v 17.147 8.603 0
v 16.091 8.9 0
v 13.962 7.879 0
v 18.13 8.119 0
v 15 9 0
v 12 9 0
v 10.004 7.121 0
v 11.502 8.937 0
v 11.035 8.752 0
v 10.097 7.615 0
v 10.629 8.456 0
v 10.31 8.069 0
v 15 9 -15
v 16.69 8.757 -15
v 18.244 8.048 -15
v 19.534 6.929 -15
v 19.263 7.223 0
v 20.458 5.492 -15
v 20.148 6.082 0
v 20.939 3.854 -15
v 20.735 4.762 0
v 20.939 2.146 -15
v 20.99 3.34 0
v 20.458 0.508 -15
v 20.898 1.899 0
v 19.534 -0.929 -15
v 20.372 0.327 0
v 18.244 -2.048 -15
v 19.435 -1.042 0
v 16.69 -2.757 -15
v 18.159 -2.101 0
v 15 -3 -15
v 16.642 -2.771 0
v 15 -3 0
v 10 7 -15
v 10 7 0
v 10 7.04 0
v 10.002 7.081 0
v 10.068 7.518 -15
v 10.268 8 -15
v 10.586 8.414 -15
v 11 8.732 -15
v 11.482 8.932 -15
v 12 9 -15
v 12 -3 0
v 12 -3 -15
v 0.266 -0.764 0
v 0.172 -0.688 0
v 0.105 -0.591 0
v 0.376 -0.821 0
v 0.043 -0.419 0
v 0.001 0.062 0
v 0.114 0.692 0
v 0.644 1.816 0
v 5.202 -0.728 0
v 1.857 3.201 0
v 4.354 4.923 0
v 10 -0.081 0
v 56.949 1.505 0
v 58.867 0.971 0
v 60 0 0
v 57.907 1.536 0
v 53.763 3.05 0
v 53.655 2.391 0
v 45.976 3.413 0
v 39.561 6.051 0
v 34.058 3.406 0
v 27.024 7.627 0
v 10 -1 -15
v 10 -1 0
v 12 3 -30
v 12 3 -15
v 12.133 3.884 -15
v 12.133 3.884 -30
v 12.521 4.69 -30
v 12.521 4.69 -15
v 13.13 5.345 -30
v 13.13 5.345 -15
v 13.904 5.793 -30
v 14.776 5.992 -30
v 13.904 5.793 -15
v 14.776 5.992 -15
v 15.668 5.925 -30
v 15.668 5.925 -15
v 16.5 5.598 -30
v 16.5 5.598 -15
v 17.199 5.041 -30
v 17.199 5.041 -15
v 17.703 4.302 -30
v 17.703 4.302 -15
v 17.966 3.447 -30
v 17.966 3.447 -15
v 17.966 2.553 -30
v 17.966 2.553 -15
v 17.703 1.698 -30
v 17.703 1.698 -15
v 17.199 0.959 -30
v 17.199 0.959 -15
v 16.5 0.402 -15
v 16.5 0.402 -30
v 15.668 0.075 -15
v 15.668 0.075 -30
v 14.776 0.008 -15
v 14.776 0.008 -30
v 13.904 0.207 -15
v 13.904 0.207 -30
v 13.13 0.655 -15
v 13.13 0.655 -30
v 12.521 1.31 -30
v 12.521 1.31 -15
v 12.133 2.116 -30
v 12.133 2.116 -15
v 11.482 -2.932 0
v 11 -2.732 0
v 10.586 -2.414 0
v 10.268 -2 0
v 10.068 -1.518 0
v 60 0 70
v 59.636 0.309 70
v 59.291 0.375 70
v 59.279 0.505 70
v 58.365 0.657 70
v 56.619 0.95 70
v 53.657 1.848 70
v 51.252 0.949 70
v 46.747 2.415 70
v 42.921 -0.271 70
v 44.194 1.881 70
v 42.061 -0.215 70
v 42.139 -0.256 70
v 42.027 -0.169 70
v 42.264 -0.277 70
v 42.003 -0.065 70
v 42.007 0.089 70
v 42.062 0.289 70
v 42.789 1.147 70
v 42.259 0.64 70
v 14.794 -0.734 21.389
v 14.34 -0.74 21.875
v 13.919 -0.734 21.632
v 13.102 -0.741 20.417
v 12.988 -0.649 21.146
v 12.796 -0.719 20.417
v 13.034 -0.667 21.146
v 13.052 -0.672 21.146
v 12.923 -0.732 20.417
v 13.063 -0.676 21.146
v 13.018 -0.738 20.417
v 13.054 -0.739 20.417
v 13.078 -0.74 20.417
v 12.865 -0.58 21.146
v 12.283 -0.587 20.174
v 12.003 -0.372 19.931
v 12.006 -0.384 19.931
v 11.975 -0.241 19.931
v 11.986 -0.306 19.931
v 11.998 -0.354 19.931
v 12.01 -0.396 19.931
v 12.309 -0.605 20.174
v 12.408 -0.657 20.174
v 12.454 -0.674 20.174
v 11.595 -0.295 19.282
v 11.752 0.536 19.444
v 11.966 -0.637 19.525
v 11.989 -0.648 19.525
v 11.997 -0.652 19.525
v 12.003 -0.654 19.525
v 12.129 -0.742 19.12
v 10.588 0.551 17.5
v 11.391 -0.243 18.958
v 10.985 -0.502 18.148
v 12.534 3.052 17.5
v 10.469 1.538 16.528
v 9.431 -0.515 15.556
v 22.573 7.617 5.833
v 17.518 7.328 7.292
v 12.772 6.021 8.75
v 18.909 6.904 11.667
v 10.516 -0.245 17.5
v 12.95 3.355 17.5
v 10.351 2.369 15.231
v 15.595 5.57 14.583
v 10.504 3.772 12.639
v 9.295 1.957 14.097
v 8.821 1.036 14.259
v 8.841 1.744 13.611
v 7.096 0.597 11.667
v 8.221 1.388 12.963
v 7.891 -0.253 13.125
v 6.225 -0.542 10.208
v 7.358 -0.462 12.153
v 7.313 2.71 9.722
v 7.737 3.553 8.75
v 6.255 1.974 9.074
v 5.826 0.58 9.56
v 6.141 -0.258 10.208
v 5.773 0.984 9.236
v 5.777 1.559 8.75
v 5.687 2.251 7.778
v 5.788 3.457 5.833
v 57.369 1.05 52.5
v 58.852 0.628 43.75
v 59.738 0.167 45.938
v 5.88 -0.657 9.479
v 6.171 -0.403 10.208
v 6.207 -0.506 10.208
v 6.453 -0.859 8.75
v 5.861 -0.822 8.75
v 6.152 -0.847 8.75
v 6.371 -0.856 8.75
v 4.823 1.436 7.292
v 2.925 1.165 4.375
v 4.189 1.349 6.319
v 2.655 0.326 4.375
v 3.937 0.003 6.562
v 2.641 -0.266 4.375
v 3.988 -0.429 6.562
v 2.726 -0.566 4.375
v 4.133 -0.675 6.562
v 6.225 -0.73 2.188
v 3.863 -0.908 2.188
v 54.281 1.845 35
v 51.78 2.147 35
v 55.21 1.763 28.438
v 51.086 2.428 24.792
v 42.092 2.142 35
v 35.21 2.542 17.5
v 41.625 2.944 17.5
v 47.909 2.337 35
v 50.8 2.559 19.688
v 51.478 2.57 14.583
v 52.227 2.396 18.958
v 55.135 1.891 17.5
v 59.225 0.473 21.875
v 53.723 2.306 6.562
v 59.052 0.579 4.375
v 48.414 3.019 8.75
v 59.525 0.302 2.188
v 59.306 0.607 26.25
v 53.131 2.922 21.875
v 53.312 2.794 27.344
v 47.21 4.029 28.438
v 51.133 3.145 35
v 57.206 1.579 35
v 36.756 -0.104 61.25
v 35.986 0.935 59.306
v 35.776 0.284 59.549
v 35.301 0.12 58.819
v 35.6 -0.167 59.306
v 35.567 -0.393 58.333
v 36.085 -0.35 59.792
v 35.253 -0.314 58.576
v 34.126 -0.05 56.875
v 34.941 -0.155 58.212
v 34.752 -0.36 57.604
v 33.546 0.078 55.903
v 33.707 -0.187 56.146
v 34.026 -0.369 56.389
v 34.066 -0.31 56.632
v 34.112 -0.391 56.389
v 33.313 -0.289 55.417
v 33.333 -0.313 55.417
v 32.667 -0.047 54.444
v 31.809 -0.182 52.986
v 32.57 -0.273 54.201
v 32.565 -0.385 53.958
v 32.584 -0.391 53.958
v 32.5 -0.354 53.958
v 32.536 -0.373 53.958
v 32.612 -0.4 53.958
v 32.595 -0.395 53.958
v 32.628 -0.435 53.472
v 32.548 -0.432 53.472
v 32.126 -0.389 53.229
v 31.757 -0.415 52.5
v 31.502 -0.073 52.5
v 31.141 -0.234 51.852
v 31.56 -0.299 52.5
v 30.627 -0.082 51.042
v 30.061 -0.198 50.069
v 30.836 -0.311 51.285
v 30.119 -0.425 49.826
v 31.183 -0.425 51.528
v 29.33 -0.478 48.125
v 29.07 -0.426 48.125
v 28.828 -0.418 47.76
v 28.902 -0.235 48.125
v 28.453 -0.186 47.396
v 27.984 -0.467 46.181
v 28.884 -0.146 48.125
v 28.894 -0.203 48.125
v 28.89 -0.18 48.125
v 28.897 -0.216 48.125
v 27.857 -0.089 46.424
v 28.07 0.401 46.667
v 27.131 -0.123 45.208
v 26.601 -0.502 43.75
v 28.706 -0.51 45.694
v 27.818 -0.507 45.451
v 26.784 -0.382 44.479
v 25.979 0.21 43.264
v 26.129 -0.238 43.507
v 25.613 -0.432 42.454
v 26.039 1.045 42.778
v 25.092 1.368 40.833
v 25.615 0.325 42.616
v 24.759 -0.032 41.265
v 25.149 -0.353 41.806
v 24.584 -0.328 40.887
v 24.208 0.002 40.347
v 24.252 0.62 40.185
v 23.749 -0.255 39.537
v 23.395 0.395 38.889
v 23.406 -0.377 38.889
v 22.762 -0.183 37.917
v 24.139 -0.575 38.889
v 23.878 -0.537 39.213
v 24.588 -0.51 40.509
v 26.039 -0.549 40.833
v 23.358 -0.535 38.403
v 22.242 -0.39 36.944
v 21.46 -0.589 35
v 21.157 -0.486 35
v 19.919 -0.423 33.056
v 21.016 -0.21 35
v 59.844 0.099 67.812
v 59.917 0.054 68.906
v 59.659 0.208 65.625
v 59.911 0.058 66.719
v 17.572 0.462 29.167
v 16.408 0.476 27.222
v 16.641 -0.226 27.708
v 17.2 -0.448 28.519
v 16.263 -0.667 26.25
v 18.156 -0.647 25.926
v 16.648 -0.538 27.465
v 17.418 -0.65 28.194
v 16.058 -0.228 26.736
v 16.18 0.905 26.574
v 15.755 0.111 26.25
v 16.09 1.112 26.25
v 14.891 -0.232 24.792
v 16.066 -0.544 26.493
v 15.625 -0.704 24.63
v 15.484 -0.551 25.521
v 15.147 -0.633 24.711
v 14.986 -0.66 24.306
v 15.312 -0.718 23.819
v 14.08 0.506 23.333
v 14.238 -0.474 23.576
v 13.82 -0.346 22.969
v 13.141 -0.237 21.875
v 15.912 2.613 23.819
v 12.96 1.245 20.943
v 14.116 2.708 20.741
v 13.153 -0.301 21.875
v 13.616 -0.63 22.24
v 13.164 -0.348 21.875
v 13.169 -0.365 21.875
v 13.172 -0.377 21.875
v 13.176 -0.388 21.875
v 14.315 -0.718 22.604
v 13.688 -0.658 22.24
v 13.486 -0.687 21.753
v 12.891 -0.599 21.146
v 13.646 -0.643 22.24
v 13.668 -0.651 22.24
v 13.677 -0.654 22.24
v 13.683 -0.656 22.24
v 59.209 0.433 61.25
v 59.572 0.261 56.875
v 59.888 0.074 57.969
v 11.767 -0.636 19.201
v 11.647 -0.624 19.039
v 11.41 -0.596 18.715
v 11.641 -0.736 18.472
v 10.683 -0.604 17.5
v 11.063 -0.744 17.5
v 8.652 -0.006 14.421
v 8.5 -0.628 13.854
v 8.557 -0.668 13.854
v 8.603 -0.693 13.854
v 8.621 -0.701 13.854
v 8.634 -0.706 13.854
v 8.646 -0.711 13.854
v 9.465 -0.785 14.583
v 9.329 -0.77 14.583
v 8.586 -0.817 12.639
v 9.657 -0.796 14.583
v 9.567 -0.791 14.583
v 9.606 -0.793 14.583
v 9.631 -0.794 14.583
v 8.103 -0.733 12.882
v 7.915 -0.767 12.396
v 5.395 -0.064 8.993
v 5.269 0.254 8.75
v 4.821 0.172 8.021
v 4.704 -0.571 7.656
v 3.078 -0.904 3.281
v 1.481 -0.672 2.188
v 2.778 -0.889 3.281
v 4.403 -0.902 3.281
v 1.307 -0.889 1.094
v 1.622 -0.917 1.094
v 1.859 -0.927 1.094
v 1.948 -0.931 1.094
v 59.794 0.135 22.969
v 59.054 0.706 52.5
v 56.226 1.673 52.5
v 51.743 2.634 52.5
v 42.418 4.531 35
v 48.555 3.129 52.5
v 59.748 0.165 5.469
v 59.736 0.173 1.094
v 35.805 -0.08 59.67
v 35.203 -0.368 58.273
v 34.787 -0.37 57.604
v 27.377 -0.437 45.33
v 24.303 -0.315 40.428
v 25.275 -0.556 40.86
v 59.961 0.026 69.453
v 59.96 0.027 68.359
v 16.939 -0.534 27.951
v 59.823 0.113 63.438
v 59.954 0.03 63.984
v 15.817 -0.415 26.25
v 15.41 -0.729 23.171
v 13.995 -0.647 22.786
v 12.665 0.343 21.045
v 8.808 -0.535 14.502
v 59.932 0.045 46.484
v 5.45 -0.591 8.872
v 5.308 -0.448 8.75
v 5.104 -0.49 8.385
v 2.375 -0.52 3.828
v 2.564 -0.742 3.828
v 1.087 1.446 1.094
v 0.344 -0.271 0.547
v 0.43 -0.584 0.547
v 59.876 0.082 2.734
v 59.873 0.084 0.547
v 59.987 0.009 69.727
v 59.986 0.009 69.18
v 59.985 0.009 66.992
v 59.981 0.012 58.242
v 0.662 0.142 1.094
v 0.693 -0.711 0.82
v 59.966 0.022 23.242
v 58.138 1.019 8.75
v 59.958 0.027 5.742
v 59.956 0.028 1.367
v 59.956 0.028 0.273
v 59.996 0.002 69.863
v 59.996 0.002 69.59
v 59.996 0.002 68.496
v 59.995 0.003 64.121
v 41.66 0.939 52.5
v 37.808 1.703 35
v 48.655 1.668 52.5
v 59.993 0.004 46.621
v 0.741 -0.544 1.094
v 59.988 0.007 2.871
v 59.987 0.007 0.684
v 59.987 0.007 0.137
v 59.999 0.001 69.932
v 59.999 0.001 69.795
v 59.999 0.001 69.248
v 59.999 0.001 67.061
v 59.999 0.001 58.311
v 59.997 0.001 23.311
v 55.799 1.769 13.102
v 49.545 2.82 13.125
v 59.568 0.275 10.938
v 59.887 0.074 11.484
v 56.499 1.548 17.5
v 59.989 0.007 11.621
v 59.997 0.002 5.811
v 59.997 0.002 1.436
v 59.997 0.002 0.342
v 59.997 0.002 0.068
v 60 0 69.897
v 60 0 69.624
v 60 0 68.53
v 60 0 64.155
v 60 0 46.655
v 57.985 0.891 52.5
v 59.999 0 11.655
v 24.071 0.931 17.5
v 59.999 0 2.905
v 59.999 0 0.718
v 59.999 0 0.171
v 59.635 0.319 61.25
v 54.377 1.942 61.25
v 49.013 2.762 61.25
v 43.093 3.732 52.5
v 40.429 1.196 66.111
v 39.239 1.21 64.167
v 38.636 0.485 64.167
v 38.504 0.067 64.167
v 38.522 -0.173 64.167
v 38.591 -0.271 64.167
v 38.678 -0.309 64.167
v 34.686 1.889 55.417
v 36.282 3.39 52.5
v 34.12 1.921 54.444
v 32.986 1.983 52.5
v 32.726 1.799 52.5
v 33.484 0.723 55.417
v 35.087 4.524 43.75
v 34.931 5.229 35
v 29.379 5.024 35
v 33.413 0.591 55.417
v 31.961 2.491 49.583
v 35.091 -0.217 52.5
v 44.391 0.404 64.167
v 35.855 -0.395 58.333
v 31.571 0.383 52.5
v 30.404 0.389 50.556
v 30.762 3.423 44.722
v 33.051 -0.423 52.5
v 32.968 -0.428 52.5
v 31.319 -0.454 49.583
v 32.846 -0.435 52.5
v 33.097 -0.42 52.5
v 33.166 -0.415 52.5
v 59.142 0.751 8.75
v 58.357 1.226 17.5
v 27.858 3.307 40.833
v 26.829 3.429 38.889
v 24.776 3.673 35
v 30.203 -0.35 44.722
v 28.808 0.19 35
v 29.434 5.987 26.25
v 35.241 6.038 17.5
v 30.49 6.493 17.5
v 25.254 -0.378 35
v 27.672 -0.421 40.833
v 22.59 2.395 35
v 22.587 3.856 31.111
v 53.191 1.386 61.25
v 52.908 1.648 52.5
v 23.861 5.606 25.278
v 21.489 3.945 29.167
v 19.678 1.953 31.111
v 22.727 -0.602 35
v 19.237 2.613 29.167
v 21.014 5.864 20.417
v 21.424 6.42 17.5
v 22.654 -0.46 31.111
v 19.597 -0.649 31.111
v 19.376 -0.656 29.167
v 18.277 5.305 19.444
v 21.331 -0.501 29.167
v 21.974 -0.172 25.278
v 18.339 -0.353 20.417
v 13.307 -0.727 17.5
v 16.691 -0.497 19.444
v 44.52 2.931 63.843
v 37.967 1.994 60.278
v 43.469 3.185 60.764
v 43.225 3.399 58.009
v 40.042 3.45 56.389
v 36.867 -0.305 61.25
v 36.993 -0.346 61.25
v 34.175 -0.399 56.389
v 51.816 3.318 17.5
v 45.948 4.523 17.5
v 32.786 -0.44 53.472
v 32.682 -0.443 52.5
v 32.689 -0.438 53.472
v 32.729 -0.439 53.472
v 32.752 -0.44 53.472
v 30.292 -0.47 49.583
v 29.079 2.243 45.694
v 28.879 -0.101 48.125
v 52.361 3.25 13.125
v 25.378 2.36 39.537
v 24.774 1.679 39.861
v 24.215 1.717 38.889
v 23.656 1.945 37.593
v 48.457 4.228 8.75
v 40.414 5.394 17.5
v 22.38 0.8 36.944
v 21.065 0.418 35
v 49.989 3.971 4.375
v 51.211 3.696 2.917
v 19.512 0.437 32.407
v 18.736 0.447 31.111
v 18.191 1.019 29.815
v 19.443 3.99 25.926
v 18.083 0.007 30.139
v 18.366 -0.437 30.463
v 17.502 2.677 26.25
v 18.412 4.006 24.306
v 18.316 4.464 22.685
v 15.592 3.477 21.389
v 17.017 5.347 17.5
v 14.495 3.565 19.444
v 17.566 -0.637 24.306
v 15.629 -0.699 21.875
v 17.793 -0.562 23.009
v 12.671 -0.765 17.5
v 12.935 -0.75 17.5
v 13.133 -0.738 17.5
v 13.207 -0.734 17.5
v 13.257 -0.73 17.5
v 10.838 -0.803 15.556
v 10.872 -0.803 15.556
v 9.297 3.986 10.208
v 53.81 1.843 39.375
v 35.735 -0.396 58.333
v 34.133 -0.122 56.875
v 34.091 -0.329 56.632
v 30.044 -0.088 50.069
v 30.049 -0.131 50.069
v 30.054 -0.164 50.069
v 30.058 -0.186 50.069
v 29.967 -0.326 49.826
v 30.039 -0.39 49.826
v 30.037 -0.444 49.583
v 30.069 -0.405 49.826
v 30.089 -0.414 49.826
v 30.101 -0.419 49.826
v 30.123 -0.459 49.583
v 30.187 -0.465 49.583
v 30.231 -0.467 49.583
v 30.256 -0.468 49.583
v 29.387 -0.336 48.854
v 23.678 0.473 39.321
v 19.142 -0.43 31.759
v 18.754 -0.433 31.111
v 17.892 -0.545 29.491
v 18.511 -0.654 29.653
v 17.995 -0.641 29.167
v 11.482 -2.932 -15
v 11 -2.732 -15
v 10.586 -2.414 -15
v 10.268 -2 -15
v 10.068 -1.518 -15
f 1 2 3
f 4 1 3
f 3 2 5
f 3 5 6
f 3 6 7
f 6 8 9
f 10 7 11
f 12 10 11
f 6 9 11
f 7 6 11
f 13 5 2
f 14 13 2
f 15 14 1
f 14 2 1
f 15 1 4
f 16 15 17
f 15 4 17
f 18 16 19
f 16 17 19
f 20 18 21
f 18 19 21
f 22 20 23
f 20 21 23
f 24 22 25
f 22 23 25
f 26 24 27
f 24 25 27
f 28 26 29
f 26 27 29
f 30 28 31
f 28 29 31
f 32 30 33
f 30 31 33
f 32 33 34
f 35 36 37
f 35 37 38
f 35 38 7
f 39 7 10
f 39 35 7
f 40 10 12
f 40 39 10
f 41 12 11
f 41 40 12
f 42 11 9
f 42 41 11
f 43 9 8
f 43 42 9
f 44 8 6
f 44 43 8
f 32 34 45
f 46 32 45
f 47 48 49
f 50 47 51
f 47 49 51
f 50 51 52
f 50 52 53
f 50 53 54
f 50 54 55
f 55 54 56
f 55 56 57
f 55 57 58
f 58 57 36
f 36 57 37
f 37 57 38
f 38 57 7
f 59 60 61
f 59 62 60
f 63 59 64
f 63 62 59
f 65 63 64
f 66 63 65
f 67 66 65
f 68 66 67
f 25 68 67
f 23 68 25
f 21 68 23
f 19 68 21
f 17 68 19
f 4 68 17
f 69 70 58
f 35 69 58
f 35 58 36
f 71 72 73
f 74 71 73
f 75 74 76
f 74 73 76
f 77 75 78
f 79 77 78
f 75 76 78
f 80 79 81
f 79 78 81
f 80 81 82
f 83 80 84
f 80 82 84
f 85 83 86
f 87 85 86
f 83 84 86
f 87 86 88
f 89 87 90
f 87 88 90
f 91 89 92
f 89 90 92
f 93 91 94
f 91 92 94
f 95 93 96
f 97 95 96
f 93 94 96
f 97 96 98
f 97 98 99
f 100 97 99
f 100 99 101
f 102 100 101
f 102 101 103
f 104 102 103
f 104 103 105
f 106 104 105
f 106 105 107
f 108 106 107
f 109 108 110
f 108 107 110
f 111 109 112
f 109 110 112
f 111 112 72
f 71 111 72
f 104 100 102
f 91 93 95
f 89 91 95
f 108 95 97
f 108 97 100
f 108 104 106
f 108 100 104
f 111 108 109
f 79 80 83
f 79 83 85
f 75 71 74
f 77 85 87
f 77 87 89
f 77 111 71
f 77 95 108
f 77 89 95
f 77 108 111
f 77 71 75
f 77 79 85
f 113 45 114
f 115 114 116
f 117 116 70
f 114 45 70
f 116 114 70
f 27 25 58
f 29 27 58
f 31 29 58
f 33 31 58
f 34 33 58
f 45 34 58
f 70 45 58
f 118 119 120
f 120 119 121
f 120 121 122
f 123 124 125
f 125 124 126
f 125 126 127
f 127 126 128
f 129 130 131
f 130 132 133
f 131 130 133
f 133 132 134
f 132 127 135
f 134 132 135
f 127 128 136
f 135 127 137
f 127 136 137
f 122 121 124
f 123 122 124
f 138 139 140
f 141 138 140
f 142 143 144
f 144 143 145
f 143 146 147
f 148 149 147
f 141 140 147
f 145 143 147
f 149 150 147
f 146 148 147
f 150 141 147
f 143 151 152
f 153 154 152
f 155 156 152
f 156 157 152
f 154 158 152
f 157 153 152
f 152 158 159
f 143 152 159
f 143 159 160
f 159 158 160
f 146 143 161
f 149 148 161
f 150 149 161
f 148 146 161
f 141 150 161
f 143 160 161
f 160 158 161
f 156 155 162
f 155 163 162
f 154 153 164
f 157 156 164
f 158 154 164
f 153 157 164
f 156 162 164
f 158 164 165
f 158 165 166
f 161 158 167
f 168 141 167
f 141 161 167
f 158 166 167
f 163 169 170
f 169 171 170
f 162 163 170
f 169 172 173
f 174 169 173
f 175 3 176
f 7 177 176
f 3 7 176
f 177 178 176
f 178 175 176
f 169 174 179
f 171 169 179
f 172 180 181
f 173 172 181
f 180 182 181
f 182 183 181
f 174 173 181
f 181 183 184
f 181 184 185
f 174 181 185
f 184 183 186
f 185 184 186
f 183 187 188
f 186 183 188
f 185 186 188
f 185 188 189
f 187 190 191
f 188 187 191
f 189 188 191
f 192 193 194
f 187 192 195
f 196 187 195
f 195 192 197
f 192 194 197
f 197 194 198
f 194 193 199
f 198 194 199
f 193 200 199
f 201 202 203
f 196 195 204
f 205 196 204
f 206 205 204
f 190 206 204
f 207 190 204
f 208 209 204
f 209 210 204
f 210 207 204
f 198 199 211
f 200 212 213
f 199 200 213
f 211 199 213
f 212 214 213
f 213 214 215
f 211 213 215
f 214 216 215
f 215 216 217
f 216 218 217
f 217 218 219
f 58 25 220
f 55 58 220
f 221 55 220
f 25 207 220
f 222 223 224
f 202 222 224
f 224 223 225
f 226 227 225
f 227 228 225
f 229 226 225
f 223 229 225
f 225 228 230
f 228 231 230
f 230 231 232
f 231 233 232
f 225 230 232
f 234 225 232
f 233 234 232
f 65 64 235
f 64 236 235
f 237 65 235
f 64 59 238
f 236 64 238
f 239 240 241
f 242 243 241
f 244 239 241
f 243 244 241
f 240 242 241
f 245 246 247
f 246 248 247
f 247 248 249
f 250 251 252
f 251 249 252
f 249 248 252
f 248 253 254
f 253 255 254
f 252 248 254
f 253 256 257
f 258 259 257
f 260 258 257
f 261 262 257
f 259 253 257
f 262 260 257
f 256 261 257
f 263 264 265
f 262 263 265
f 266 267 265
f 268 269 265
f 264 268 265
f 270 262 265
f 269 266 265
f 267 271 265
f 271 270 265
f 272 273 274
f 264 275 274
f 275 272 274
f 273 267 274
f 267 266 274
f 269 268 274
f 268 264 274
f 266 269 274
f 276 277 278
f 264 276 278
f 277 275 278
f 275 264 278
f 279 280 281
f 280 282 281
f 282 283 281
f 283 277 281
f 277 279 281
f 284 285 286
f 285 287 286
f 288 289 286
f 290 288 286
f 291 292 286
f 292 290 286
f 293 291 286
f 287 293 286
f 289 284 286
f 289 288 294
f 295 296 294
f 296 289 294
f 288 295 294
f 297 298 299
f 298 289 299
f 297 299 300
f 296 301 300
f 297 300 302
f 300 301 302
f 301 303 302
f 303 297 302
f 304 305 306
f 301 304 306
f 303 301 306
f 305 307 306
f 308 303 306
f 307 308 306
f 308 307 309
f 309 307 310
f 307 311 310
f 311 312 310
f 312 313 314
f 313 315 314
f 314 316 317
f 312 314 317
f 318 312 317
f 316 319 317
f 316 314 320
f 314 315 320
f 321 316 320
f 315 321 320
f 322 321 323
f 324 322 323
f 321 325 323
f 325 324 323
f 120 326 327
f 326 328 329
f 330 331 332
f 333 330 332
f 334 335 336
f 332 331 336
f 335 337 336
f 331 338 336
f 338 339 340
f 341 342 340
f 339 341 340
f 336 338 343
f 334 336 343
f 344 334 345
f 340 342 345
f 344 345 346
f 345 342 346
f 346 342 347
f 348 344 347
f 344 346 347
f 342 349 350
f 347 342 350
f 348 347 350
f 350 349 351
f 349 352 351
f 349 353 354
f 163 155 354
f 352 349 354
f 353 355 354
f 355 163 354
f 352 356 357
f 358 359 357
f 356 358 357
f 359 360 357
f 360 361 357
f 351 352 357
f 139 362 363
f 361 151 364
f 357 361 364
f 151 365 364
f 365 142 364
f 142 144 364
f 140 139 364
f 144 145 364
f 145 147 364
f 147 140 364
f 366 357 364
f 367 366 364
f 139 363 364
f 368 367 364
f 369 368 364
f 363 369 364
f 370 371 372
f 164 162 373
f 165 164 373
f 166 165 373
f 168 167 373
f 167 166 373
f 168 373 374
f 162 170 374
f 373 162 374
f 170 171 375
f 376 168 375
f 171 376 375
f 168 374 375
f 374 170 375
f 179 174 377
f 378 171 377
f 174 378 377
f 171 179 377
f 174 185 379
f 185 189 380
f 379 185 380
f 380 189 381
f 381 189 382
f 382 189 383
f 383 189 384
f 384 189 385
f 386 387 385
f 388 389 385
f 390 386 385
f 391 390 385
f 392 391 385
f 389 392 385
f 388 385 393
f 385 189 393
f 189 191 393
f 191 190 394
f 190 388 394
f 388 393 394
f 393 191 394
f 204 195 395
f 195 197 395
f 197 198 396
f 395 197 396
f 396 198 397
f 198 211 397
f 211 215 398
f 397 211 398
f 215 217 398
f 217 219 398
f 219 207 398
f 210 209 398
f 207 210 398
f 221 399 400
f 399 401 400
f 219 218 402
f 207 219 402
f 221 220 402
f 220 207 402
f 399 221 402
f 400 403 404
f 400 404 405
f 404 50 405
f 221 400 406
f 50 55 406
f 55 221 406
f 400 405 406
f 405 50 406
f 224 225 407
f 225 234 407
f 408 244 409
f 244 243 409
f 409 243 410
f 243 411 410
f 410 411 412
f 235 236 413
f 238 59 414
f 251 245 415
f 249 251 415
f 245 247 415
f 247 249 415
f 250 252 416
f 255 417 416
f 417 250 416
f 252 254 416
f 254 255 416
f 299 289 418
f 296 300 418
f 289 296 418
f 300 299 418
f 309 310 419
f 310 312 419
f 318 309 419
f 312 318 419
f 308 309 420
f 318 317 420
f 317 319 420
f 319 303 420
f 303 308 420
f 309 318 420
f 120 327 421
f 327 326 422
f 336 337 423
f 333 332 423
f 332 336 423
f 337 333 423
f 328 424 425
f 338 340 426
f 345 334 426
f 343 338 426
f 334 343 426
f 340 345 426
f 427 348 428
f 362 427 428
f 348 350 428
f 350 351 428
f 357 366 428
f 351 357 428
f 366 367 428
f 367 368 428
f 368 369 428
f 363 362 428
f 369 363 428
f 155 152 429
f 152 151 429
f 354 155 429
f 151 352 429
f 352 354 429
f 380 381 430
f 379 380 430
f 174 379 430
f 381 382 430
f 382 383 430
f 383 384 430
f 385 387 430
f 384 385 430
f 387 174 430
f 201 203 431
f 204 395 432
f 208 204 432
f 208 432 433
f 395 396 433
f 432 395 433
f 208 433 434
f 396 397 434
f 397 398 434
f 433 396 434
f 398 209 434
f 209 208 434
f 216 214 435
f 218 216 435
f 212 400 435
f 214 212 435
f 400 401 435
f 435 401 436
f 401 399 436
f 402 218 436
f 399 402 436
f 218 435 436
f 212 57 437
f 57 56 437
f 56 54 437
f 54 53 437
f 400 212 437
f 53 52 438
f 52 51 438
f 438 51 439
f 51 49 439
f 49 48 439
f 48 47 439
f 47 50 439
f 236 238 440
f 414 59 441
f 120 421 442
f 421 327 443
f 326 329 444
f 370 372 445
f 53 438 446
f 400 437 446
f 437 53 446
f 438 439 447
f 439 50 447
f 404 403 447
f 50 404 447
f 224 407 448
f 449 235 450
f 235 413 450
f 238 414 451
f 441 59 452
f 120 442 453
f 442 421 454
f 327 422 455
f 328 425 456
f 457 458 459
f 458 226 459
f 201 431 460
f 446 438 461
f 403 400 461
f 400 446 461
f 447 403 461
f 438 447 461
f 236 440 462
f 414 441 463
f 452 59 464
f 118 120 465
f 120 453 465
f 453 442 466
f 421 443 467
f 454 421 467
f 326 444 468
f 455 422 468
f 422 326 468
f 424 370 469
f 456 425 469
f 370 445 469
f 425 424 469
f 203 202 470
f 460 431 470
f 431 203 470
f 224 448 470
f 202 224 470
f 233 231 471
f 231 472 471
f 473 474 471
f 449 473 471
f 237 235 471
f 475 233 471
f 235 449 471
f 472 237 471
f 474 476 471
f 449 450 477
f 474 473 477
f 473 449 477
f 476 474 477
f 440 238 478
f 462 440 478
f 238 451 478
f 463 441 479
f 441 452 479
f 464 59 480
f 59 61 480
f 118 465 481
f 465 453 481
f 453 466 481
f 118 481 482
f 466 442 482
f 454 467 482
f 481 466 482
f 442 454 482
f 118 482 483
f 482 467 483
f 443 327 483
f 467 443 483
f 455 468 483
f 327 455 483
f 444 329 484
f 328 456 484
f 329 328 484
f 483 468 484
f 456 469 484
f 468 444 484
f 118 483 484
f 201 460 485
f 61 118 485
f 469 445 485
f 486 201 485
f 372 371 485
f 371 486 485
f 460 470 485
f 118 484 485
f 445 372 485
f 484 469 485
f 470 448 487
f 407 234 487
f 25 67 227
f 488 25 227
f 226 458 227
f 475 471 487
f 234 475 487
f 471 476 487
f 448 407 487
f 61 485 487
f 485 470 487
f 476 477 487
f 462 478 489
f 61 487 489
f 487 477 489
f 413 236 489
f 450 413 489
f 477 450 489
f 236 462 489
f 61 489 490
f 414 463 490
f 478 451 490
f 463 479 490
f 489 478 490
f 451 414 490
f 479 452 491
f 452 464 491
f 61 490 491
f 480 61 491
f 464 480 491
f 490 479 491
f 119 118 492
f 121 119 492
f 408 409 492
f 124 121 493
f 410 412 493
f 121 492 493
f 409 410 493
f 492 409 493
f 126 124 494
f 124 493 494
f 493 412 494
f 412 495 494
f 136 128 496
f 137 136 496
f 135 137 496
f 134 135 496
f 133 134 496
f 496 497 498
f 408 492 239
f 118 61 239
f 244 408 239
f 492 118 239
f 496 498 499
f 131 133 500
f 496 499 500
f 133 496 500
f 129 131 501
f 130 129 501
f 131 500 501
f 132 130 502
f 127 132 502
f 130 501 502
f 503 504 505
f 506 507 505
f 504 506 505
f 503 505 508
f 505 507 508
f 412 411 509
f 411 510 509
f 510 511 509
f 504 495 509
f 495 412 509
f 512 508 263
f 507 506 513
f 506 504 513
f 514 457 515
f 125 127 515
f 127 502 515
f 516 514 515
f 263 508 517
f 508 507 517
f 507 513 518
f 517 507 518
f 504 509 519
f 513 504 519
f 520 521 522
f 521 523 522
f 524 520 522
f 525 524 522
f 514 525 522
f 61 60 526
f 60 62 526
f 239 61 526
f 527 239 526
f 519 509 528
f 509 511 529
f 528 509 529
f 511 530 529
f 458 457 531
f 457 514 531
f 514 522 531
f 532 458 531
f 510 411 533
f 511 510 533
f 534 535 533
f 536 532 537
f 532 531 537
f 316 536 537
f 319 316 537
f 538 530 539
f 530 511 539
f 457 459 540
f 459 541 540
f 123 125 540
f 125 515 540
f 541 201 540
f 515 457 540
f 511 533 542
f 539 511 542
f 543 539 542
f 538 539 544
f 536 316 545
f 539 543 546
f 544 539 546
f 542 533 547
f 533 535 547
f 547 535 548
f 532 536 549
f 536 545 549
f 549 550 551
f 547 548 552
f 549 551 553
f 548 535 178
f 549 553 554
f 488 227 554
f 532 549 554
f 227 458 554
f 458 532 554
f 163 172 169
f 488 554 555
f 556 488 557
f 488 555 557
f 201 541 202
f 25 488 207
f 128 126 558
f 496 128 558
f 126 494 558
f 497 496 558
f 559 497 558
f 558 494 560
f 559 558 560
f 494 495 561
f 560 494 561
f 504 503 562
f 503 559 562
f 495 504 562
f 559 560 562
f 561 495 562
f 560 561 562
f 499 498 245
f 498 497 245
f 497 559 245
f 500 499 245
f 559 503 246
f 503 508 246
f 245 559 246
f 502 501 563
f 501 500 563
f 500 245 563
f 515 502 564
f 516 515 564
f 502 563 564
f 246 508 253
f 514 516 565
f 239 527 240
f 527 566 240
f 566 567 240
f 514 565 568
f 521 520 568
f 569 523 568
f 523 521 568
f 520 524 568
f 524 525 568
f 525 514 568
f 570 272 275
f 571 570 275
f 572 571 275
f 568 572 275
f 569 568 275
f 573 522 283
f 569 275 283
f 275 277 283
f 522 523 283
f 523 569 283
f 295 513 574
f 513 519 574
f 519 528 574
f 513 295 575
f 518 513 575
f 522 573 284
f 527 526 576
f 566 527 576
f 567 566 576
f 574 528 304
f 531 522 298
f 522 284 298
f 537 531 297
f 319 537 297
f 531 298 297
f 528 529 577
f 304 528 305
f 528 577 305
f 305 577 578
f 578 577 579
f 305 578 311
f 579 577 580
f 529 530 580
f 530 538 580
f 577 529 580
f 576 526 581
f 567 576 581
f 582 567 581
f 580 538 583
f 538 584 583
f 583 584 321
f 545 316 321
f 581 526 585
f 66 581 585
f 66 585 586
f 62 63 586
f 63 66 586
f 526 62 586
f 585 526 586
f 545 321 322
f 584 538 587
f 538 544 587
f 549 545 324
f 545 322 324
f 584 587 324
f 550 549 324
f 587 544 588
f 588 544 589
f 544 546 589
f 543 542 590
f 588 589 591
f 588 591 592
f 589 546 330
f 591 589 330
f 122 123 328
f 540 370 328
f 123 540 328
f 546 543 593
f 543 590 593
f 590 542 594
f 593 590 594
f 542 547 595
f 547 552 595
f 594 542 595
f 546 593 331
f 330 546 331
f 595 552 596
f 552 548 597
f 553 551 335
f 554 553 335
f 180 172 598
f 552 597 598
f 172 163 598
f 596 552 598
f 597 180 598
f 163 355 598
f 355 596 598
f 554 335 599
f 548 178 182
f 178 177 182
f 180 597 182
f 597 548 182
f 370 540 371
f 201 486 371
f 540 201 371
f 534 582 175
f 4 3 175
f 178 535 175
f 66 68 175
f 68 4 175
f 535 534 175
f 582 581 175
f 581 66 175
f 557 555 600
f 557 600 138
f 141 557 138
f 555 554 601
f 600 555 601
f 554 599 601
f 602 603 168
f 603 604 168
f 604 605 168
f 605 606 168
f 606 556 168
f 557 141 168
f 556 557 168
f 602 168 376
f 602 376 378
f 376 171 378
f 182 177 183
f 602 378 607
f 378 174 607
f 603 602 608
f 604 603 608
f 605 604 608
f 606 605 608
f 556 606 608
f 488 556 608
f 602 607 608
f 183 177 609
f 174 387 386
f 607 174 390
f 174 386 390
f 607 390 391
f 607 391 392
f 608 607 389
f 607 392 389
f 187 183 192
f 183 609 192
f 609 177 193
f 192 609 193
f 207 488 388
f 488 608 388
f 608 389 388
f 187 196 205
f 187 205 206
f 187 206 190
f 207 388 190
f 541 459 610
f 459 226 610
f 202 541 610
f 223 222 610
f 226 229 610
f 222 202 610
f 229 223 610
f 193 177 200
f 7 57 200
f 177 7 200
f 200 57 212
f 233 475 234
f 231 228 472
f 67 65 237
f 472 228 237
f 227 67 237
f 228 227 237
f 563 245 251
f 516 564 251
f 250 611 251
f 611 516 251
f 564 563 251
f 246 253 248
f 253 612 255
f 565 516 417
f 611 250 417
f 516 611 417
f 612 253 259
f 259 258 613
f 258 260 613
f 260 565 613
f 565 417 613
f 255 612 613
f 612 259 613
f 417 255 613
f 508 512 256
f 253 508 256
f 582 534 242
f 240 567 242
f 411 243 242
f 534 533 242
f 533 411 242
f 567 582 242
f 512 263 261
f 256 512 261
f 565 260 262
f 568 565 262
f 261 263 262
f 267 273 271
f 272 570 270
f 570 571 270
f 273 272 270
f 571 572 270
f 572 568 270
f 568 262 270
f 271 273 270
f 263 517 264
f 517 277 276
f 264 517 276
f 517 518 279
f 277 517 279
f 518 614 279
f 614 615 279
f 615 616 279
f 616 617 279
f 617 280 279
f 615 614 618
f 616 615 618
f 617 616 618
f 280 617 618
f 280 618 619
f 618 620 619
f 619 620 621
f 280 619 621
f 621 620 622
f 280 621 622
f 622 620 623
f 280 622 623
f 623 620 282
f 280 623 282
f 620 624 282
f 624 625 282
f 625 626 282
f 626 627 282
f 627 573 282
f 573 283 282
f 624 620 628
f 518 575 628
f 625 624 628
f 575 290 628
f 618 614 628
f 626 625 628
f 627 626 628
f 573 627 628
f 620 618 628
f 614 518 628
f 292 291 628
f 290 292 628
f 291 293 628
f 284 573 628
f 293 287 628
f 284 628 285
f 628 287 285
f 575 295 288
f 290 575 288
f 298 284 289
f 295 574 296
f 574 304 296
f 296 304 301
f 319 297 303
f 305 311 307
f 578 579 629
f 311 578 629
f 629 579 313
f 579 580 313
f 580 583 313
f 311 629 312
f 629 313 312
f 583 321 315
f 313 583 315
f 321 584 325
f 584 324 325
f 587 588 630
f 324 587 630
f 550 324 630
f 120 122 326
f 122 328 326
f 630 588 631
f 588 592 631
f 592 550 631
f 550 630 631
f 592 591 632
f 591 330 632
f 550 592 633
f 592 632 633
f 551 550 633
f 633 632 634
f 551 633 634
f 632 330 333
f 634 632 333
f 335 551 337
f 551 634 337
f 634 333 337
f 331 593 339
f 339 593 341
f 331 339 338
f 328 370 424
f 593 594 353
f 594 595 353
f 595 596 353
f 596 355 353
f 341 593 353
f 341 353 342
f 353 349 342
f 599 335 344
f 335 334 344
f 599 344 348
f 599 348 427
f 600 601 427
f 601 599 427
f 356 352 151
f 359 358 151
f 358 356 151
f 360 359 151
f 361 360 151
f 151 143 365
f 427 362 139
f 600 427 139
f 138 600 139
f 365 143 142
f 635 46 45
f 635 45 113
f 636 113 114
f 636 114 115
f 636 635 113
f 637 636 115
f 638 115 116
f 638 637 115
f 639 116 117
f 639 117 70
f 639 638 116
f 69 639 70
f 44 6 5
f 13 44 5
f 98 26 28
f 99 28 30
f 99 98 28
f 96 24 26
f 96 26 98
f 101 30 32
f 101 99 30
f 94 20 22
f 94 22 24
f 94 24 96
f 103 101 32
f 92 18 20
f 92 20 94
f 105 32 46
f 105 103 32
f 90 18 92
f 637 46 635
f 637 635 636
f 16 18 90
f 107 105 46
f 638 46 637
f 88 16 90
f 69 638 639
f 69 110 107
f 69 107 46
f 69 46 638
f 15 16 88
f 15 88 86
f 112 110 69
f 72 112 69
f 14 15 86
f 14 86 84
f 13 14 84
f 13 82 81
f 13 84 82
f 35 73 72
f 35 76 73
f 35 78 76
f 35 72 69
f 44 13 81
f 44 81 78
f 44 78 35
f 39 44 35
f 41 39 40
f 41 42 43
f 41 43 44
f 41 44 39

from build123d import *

# Parameters (mm, degrees)
BOSS_EXTRUDE2_DEPTH = 15
SKETCH6_R           = 3
BOSS_EXTRUDE3_DEPTH = 15
FILLET1_START       = -16
FILLET1_DEPTH       = 16


with BuildPart() as part:
    # Sketch3 → Loft1 section 0
    with BuildSketch(Plane.XY.offset(70)):
        with BuildLine():
            add(Edge.make_bspline(
                [(60, 0), (60.000107759, 0.00045823), (59.940935145, 0.044545857), (59.890891538, 0.093647308), (59.779774511, 0.196205337), (59.648682422, 0.305307561), (59.469359582, 0.415294301), (59.246370858, 0.521886024), (58.977168165, 0.633116991), (58.662177205, 0.747496515), (58.302798195, 0.863953961), (57.901335106, 0.982592376), (57.458471962, 1.097979924), (56.979558848, 1.219684363), (56.464360521, 1.335758178), (55.917664884, 1.451163432), (55.342255391, 1.563645721), (54.741619221, 1.672310848), (54.119503088, 1.776862794), (53.479502393, 1.875995081), (52.825753205, 1.969890082), (52.162446062, 2.057806833), (51.494385085, 2.13946315), (50.826910973, 2.215437436), (50.165549402, 2.283812601), (49.515688388, 2.343308945), (48.88189852, 2.390577682), (48.267800241, 2.423092507), (47.676809978, 2.437133923), (47.111955291, 2.435639306), (46.574289852, 2.407982369), (46.063605386, 2.351936832), (45.577823009, 2.272687612), (45.116825477, 2.170020947), (44.681086398, 2.04962996), (44.272449438, 1.913646961), (43.892652493, 1.765251918), (43.544055665, 1.605239875), (43.227776887, 1.436859538), (42.94553682, 1.262025717), (42.699105421, 1.083107561), (42.488584367, 0.903897458), (42.317026583, 0.722439194), (42.185248322, 0.540304202), (42.08790704, 0.363111111), (42.025521579, 0.194874666), (41.995794905, 0.039592478), (42.001532957, -0.091739447), (42.035344873, -0.212191985), (42.16102918, -0.271985507), (42.33001338, -0.28037435), (42.561183137, -0.288504849), (42.85189542, -0.275968725), (43.198864607, -0.252931149), (43.598229294, -0.216029949), (44.045902873, -0.166101037), (44.539702369, -0.102073031), (45.07938647, -0.012584366), (45.667582852, 0.09963297), (46.307232102, 0.221761241), (46.995207664, 0.350711186), (47.72718833, 0.481130505), (48.497798407, 0.608124713), (49.301059449, 0.727453141), (50.130048988, 0.834738394), (50.977312155, 0.926856584), (51.834845451, 0.99967222), (52.694043317, 1.051289527), (53.545929342, 1.07966642), (54.381262057, 1.083250625), (55.190722018, 1.061798612), (55.965040428, 1.015812577), (56.694906217, 0.945885863), (57.371629898, 0.8547026), (57.986400744, 0.744908581), (58.532010839, 0.620180946), (58.99840484, 0.486716819), (59.380100231, 0.344272382), (59.652430067, 0.213917485), (59.853211585, 0.093386968), (59.93034321, 0.046743647), (59.99989005, -0.000467545), (60, 0)],
                knots=[0, 0, 0, 0, 0.000979678, 0.003648865, 0.007483504, 0.012095286, 0.017525603, 0.024051797, 0.031783073, 0.040677857, 0.050710337, 0.061833274, 0.073978206, 0.087117514, 0.1011444, 0.115989999, 0.131569795, 0.147787764, 0.164550314, 0.181757305, 0.199311377, 0.217094507, 0.234989676, 0.252856344, 0.270540067, 0.287886265, 0.304772936, 0.321100929, 0.336805584, 0.351799565, 0.366030606, 0.379615227, 0.392652524, 0.405169929, 0.417171498, 0.428603104, 0.439418554, 0.449596189, 0.459101689, 0.467907493, 0.475987922, 0.483308596, 0.48987414, 0.495802886, 0.501149052, 0.505902717, 0.510046415, 0.51357896, 0.516446578, 0.519349706, 0.523823011, 0.529973455, 0.537715321, 0.546967517, 0.557637048, 0.56962017, 0.582803823, 0.59724667, 0.613134757, 0.630443334, 0.64905587, 0.668822018, 0.68959474, 0.711189442, 0.733426497, 0.756093941, 0.778988394, 0.80188954, 0.824566471, 0.846792174, 0.868338195, 0.888978083, 0.908491945, 0.926658715, 0.943286152, 0.95816918, 0.971135801, 0.98195561, 0.990251784, 0.995852562, 0.999000405, 1, 1, 1, 1], degree=3))
        make_face()
    # Sketch2 → Loft1 section 1
    with BuildSketch(Plane.XY):
        with BuildLine():
            add(Edge.make_bspline(
                [(60, 0), (60.000359197, 0.001527432), (59.80311715, 0.148486191), (59.636305128, 0.312157693), (59.265915035, 0.654017791), (58.828941408, 1.01769187), (58.231198607, 1.384314338), (57.487902859, 1.739620081), (56.590560551, 2.110389969), (55.540590684, 2.491655052), (54.342660651, 2.879846537), (53.004450354, 3.275307919), (51.528239873, 3.659933081), (49.931862826, 4.065614543), (48.21453507, 4.45252726), (46.392216281, 4.837211439), (44.474184637, 5.212152404), (42.47206407, 5.574369492), (40.398343628, 5.92287598), (38.265007978, 6.253316937), (36.085844017, 6.566300275), (33.874820207, 6.859356111), (31.647950283, 7.131543832), (29.423036576, 7.384791452), (27.218498007, 7.612708672), (25.052294626, 7.811029816), (22.939661735, 7.968592274), (20.892667469, 8.076975023), (18.922699926, 8.123779744), (17.039850969, 8.118797688), (15.247632842, 8.026607898), (13.545351286, 7.839789441), (11.926076695, 7.575625373), (10.389418256, 7.233403155), (8.93695466, 6.832099867), (7.574831461, 6.378823205), (6.308841643, 5.884173059), (5.146852216, 5.350799583), (4.092589623, 4.789531794), (3.151789401, 4.20675239), (2.330351404, 3.610358538), (1.628614556, 3.012991527), (1.056755276, 2.408130647), (0.617494407, 1.801014007), (0.293023466, 1.210370369), (0.085071932, 0.649582219), (-0.014016985, 0.131974926), (0.005109858, -0.305798158), (0.117816245, -0.707306616), (0.536763933, -0.906618356), (1.100044602, -0.934581165), (1.870610456, -0.96168283), (2.8396514, -0.91989575), (3.996215358, -0.843103831), (5.32743098, -0.720099828), (6.819676242, -0.553670124), (8.465674563, -0.340243438), (10.264621567, -0.041947886), (12.225276175, 0.332109901), (14.357440339, 0.739204138), (16.650692214, 1.169037288), (19.090627767, 1.60376835), (21.659328024, 2.027082377), (24.336864829, 2.424843805), (27.100163295, 2.782461315), (29.924373851, 3.089521947), (32.78281817, 3.332240734), (35.646811058, 3.504298425), (38.486431141, 3.598888068), (41.270873525, 3.610835418), (43.969073393, 3.539328707), (46.550134759, 3.386041923), (48.983020725, 3.152952876), (51.238766327, 2.849008665), (53.28800248, 2.483028604), (55.106702797, 2.06726982), (56.661349467, 1.622389398), (57.933667436, 1.147574605), (58.841433556, 0.713058282), (59.510705283, 0.311289894), (59.767810701, 0.155812155), (59.999633501, -0.001558484), (60, 0)],
                knots=[0, 0, 0, 0, 0.000979678, 0.003648865, 0.007483504, 0.012095286, 0.017525603, 0.024051797, 0.031783073, 0.040677857, 0.050710337, 0.061833274, 0.073978206, 0.087117514, 0.1011444, 0.115989999, 0.131569795, 0.147787764, 0.164550314, 0.181757305, 0.199311377, 0.217094507, 0.234989676, 0.252856344, 0.270540067, 0.287886265, 0.304772936, 0.321100929, 0.336805584, 0.351799565, 0.366030606, 0.379615227, 0.392652524, 0.405169929, 0.417171498, 0.428603104, 0.439418554, 0.449596189, 0.459101689, 0.467907493, 0.475987922, 0.483308596, 0.48987414, 0.495802886, 0.501149052, 0.505902717, 0.510046415, 0.51357896, 0.516446578, 0.519349706, 0.523823011, 0.529973455, 0.537715321, 0.546967517, 0.557637048, 0.56962017, 0.582803823, 0.59724667, 0.613134757, 0.630443334, 0.64905587, 0.668822018, 0.68959474, 0.711189442, 0.733426497, 0.756093941, 0.778988394, 0.80188954, 0.824566471, 0.846792174, 0.868338195, 0.888978083, 0.908491945, 0.926658715, 0.943286152, 0.95816918, 0.971135801, 0.98195561, 0.990251784, 0.995852562, 0.999000405, 1, 1, 1, 1], degree=3))
        make_face()
    loft()

    # Sketch5 → Boss-Extrude2 (add)
    with BuildSketch(Plane.XY):
        with BuildLine():
            Line((10, 9), (15, 9))
            ThreePointArc((15, 9), (21, 3), (15, -3))
            Line((15, -3), (10, -3))
            Line((10, -3), (10, 9))
        make_face()
    extrude(amount=-BOSS_EXTRUDE2_DEPTH)

    # Sketch6 → Boss-Extrude3 (add)
    with BuildSketch(Plane(origin=(0, 0, -15), x_dir=(-1, 0, 0), z_dir=(0, 0, -1))):
        with Locations((-15, 3)):
            Circle(SKETCH6_R)
    extrude(amount=BOSS_EXTRUDE3_DEPTH)

    # Fillet1: read off the stored shape, not the designer's step
    # Fillet1 outline → Fillet1 (cut)
    with BuildSketch(Plane.XY.offset(FILLET1_START)):
        with BuildLine():
            Line((10, 9), (10, 7))
            ThreePointArc((10, 7), (10.585786438, 8.414213562), (12, 9))
            Line((12, 9), (10, 9))
        make_face()
        with BuildLine():
            ThreePointArc((12, -3), (10.585786438, -2.414213562), (10, -1))
            Line((10, -1), (10, -3))
            Line((10, -3), (12, -3))
        make_face()
    extrude(amount=FILLET1_DEPTH, mode=Mode.SUBTRACT)


solid = part.part
